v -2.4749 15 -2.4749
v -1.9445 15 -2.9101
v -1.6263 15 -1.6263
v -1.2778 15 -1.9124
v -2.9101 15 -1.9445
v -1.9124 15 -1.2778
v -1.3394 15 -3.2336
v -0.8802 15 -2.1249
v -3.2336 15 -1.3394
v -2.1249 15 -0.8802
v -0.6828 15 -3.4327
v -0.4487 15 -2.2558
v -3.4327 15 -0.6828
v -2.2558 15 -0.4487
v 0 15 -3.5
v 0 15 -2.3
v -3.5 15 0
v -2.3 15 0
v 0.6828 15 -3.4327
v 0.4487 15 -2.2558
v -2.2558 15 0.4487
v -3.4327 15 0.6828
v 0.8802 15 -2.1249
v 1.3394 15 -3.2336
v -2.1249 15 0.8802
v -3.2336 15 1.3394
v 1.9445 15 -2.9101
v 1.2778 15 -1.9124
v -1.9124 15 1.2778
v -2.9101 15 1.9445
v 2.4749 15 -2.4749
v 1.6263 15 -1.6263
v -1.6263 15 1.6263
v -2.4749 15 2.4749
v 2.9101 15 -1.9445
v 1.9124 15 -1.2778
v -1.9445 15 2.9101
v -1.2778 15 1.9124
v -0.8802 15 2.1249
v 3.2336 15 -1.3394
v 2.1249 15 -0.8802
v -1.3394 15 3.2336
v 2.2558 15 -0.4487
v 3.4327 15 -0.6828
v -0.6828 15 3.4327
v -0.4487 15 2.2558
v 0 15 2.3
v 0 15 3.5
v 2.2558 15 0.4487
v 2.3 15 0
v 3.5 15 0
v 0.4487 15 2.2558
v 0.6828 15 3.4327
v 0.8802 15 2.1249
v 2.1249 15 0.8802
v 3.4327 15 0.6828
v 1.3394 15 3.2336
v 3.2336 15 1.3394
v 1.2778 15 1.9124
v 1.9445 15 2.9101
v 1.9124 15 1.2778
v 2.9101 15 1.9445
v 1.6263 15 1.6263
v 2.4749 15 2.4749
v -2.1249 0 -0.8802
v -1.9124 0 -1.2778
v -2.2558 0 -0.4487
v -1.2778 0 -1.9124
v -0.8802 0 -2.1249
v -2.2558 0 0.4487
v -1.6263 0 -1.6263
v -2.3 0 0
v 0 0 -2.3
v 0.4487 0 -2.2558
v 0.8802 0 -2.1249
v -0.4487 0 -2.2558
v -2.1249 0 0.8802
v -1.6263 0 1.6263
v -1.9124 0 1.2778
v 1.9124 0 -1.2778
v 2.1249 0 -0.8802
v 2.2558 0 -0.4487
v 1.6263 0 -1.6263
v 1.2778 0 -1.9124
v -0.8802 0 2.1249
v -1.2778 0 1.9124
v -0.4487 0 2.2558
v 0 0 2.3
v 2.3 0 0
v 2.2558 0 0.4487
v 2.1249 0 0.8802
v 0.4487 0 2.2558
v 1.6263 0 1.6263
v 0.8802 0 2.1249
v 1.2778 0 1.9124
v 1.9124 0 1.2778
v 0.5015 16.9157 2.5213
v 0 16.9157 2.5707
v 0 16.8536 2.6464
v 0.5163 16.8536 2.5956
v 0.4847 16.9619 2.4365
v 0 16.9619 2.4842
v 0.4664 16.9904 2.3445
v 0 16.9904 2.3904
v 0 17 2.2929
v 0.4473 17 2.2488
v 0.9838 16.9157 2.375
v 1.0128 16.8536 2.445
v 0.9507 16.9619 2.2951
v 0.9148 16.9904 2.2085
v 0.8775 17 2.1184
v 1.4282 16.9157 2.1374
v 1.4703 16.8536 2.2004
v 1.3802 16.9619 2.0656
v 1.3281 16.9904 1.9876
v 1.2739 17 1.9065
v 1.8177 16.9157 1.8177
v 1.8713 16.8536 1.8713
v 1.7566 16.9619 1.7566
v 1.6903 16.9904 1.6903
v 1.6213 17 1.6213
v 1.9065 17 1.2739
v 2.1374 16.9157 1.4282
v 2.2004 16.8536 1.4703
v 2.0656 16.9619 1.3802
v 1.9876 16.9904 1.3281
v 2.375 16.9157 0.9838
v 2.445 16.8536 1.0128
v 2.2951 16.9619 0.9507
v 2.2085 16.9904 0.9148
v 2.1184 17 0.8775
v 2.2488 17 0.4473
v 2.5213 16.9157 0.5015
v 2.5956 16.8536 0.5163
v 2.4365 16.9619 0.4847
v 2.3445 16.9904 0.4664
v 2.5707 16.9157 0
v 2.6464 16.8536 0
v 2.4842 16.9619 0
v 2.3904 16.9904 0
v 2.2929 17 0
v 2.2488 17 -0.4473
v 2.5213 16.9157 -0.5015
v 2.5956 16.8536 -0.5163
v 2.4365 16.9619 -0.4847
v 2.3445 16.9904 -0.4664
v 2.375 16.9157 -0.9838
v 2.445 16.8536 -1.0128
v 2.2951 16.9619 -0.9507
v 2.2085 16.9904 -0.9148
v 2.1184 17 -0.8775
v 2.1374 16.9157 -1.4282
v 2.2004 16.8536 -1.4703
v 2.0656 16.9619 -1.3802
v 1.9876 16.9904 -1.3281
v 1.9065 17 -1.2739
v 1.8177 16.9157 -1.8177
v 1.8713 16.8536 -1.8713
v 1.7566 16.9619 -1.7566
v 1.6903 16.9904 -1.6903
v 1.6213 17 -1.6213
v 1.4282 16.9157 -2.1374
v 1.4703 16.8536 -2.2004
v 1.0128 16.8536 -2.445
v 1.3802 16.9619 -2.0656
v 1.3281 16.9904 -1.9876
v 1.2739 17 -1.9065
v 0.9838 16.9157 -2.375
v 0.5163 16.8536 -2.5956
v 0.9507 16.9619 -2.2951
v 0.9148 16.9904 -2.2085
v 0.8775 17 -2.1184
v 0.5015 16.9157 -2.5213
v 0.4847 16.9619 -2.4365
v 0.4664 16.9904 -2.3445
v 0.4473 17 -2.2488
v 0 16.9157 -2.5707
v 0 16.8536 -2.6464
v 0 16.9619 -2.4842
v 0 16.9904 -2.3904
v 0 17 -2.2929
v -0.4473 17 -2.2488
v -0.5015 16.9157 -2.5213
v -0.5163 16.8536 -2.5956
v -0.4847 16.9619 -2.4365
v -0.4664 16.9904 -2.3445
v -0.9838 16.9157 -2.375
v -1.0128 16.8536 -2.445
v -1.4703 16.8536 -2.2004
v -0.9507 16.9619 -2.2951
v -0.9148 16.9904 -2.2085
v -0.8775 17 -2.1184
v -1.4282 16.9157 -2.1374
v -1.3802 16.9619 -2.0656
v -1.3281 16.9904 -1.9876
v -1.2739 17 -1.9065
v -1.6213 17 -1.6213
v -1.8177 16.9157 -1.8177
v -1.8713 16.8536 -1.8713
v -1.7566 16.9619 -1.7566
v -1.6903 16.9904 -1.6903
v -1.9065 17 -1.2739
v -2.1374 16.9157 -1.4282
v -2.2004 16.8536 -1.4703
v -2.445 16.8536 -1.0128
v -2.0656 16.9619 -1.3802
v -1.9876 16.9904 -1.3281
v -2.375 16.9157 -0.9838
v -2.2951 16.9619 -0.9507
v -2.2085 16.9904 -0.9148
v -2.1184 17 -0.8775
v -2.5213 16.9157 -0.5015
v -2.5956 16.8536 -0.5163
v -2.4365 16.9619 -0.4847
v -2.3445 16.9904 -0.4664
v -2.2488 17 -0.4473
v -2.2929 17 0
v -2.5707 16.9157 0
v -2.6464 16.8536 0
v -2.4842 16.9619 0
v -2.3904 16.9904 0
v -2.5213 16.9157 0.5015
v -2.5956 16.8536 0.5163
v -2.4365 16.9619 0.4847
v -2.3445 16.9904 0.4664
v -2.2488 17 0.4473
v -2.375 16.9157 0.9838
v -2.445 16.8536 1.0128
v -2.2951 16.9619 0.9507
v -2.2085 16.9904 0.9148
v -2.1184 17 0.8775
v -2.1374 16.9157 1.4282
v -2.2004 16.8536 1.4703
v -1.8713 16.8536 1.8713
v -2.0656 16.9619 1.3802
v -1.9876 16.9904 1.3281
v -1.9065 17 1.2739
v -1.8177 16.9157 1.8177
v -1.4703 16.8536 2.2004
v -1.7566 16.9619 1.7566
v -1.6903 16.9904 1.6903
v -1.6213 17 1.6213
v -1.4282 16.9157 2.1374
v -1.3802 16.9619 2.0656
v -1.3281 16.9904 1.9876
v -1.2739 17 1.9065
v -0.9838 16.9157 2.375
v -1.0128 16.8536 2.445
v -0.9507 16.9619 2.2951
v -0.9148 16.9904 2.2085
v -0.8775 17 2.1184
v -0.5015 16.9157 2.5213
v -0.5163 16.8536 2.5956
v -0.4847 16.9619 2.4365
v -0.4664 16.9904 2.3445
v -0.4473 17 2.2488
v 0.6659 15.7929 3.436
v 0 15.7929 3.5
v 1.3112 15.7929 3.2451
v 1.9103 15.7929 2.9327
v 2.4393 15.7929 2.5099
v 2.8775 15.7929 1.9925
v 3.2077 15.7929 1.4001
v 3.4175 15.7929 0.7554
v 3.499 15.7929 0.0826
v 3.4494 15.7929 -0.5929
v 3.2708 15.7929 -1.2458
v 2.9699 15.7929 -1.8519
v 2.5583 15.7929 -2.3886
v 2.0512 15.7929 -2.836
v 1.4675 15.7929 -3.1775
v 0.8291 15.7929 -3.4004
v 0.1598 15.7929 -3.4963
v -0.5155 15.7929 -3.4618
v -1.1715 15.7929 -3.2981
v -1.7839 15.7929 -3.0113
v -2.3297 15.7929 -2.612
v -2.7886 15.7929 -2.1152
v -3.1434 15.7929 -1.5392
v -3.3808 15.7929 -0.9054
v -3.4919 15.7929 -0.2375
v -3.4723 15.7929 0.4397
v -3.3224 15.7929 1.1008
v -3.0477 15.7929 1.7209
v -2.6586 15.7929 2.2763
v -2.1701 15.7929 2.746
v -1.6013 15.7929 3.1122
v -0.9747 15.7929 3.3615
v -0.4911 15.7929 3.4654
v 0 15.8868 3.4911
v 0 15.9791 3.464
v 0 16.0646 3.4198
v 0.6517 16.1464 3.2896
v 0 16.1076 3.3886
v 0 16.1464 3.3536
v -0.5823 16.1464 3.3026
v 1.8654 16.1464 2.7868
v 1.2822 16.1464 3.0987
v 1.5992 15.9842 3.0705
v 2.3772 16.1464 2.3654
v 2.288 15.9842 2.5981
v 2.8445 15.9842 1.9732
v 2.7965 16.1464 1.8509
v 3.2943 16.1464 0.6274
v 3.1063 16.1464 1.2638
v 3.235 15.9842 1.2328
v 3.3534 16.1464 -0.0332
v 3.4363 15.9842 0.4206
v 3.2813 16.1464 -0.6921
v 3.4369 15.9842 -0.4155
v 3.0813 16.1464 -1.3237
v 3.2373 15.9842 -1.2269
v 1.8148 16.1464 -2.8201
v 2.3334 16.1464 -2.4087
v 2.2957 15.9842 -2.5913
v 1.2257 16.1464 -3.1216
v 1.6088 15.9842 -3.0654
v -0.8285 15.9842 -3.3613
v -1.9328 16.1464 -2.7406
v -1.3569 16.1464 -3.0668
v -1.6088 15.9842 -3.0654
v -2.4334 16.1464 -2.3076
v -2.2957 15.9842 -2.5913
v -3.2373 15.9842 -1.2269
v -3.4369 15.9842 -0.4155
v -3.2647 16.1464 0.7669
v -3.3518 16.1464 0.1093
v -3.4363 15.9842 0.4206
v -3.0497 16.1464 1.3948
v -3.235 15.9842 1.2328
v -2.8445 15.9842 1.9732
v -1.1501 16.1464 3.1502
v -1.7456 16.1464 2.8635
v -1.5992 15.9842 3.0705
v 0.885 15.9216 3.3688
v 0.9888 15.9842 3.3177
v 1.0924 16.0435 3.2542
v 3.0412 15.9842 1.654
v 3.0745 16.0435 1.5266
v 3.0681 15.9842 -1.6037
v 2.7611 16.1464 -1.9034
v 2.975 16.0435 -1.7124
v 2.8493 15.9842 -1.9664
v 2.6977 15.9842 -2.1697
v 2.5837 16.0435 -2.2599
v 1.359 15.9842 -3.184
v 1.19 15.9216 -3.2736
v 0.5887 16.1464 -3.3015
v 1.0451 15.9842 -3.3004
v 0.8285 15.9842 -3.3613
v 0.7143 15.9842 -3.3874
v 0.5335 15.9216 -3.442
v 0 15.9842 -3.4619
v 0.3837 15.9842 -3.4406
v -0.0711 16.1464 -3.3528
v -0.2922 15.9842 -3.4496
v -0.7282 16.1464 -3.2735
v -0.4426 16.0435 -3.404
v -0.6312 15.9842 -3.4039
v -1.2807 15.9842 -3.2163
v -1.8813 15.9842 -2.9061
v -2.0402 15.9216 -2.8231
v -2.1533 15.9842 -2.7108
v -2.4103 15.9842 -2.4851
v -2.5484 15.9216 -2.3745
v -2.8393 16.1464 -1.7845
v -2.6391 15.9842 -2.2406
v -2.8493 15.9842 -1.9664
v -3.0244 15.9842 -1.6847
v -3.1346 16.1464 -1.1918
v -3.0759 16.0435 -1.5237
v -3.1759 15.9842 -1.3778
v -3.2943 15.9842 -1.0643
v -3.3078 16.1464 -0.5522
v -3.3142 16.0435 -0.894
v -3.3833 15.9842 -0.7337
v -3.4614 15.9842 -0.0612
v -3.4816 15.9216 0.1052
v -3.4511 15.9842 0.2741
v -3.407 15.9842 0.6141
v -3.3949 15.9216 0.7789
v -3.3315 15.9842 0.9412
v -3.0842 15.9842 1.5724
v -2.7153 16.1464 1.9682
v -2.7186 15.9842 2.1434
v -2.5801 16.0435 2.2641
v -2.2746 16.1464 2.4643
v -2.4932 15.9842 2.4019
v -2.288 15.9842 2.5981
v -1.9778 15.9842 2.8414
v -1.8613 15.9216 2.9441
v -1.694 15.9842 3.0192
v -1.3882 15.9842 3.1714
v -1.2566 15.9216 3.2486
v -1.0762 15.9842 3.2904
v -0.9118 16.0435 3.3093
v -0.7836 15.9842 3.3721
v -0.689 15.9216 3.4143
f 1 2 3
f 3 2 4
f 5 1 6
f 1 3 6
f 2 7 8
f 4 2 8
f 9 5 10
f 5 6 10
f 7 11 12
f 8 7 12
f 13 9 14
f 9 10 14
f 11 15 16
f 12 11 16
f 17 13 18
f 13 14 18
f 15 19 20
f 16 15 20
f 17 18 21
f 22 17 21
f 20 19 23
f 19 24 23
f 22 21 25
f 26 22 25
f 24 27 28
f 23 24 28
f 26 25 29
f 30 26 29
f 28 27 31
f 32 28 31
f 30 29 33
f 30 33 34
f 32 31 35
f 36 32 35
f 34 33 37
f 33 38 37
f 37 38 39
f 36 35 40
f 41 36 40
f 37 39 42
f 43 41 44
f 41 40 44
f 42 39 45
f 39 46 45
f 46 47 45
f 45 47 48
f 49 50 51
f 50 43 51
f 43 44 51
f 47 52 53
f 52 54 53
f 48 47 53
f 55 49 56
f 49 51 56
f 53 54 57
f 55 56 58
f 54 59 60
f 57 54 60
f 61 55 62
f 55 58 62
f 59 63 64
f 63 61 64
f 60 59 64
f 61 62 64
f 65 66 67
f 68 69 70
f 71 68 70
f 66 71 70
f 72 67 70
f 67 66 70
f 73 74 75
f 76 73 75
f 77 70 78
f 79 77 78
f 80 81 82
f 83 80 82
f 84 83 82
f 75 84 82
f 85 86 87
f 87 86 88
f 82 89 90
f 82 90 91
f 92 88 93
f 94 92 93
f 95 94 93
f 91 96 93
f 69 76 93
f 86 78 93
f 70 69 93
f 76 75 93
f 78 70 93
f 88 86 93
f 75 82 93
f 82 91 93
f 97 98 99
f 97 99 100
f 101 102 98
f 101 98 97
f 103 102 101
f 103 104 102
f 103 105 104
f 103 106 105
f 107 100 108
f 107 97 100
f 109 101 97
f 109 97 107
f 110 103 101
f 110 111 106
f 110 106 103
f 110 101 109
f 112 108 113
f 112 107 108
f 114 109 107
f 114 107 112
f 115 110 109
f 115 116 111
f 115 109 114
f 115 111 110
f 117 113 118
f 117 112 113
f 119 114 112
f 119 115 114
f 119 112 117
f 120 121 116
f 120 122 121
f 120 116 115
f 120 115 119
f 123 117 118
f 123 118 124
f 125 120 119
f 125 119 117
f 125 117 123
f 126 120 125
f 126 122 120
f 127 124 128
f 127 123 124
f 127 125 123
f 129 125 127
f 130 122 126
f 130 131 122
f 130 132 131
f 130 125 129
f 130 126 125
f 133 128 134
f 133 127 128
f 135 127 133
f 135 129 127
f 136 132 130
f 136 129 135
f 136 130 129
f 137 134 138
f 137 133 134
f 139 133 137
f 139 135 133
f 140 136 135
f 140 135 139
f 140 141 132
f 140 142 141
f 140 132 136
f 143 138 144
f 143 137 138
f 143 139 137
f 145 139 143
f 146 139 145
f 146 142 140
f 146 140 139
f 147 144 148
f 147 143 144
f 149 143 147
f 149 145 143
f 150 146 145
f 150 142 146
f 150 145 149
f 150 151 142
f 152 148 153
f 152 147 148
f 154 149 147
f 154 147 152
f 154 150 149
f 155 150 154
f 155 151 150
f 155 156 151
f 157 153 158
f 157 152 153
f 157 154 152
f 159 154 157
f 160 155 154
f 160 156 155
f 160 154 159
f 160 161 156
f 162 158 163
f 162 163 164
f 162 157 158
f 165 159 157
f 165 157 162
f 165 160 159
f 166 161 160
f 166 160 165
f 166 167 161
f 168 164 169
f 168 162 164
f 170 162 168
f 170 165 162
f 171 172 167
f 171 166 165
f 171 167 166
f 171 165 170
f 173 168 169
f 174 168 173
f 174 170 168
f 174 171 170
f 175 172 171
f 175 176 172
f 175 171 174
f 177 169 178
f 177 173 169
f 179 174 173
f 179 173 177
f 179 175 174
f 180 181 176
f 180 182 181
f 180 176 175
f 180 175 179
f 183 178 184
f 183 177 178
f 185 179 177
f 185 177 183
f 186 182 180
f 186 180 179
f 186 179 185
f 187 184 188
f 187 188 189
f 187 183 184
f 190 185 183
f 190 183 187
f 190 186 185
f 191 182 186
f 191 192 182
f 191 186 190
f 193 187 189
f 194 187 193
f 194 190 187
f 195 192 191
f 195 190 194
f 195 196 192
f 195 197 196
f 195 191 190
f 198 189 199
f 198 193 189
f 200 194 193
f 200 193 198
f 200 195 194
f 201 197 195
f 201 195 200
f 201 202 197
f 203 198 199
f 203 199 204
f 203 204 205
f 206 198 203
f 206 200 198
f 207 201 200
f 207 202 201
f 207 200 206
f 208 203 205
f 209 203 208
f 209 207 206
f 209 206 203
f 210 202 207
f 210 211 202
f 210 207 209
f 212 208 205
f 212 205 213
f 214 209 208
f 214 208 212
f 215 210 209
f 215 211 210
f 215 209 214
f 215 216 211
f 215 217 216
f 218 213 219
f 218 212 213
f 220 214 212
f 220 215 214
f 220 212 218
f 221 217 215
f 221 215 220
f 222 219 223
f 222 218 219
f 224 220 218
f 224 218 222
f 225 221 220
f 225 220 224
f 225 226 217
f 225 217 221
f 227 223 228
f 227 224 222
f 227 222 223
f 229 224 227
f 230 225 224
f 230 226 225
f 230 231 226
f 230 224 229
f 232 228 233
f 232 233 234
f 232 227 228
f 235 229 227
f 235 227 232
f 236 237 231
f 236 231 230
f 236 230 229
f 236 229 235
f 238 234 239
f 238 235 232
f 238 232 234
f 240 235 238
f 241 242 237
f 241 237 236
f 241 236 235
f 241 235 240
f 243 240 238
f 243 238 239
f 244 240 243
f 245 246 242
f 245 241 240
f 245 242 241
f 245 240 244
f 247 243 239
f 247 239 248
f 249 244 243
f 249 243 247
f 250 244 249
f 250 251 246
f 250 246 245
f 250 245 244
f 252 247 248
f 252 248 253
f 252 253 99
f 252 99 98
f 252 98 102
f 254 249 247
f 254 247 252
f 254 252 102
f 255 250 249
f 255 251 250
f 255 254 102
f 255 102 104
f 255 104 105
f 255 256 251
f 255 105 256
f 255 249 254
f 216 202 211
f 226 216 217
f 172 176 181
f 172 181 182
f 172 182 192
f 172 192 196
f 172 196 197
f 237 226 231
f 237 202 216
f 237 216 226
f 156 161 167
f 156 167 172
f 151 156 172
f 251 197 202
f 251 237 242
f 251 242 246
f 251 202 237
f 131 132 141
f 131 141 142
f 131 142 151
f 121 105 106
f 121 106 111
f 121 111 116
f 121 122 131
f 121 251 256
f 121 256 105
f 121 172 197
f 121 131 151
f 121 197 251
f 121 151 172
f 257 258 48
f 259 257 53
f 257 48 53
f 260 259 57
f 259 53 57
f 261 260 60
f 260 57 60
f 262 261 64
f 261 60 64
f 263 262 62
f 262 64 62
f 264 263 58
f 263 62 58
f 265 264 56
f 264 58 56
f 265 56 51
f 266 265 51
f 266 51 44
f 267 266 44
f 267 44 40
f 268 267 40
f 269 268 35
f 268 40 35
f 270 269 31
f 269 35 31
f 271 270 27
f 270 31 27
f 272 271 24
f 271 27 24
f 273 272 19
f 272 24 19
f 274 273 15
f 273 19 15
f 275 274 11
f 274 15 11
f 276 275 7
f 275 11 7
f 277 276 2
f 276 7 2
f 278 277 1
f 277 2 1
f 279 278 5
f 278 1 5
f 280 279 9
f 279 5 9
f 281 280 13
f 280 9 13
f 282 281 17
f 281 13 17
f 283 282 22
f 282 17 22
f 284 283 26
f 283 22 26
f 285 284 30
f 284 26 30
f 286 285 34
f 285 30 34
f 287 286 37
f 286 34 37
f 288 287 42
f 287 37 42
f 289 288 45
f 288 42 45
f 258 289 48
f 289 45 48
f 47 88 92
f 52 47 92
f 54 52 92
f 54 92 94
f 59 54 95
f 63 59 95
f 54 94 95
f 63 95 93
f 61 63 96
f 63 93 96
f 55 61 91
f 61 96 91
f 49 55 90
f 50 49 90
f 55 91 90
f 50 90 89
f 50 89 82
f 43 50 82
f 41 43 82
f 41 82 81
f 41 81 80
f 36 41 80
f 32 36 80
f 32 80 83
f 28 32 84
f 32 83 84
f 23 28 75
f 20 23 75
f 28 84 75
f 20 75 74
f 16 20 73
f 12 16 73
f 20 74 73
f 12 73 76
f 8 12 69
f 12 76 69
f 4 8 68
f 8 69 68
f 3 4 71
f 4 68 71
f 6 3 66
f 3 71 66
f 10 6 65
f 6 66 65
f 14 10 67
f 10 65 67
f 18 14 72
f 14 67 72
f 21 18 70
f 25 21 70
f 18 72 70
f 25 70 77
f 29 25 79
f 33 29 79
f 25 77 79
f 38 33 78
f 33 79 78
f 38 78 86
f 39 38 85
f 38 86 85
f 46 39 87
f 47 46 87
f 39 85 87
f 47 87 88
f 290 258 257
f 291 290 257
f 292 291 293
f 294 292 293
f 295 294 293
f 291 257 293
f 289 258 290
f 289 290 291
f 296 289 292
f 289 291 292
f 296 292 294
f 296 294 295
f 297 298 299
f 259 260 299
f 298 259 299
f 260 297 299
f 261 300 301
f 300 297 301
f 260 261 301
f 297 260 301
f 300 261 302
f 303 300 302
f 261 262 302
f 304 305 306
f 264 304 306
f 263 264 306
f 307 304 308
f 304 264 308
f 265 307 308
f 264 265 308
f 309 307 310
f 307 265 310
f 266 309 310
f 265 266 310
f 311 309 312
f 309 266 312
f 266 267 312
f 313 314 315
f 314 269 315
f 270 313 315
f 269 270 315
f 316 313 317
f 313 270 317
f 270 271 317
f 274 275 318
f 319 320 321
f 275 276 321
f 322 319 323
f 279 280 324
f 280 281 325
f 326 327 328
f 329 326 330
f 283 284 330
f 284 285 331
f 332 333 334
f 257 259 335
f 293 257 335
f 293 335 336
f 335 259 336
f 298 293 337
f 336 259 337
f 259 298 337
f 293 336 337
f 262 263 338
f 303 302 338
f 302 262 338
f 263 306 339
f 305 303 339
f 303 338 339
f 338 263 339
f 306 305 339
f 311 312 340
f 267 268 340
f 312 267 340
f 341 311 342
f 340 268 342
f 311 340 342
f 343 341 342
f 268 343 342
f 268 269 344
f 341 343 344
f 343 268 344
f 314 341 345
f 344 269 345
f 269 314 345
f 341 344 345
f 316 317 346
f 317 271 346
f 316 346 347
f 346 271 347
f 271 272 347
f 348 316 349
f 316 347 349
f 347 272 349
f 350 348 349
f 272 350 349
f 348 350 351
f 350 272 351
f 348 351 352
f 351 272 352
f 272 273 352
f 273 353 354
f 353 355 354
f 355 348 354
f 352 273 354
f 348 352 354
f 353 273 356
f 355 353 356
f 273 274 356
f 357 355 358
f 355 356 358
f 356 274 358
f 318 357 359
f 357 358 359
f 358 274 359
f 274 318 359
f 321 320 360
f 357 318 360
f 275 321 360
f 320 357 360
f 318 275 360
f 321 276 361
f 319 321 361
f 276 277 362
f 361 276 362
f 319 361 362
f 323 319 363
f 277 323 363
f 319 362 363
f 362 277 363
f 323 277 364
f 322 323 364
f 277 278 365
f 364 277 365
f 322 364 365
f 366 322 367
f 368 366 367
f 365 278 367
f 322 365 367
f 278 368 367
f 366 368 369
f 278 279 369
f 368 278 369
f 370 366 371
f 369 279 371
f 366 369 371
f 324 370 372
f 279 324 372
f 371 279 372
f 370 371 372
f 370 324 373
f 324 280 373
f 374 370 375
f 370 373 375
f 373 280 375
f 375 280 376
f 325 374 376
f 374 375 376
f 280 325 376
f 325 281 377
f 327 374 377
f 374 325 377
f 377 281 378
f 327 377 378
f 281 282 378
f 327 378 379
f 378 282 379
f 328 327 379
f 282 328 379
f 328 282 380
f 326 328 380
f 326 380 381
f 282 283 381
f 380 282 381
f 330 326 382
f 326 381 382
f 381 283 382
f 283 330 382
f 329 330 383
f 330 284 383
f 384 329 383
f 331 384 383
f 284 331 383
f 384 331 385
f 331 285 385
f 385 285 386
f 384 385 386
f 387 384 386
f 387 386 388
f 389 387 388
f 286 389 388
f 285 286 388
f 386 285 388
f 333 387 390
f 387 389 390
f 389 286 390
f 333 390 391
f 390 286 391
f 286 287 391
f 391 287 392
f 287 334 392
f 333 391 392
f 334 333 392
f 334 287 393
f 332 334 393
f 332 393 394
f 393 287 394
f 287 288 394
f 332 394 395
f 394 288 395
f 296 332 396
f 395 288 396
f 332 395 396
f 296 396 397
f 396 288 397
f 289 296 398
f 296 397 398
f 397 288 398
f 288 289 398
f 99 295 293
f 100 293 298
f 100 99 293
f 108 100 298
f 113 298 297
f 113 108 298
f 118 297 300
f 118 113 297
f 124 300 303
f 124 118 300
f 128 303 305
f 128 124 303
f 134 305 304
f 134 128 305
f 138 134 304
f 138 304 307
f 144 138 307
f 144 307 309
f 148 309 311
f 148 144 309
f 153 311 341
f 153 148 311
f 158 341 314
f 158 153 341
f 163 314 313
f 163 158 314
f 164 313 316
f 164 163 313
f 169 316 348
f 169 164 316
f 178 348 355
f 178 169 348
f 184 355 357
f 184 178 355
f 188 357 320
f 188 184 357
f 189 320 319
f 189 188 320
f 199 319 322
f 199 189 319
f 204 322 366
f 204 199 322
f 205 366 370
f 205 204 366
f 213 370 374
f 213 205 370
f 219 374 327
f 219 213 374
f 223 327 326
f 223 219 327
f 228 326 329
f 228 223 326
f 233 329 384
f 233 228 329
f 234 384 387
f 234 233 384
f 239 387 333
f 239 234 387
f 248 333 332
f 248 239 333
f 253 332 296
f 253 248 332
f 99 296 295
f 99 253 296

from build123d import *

# Parameters (mm, degrees)
SKETCH1_R           = 2.3
BOSS_EXTRUDE1_DEPTH = 15
SKETCH2_R           = 3.5
BOSS_EXTRUDE2_DEPTH = 2
CHAMFER1_SIZE       = 1
FILLET1_R           = 0.5


with BuildPart() as part:
    # Sketch1 → Boss-Extrude1 (new body)
    with BuildSketch(Plane(origin=(0, 0, 0), x_dir=(1, 0, 0), z_dir=(0, 1, 0))):
        with Locations(Location((0, 0, 0), (0, 0, 270))):
            Circle(SKETCH1_R)
    extrude(amount=BOSS_EXTRUDE1_DEPTH)

    # Sketch2 → Boss-Extrude2 (add)
    with BuildSketch(Plane(origin=(0, 15, 0), x_dir=(1, 0, 0), z_dir=(0, 1, 0))):
        with Locations(Location((0, 0, 0), (0, 0, 270))):
            Circle(SKETCH2_R)
    extrude(amount=BOSS_EXTRUDE2_DEPTH)

    # Chamfer1
    chamfer1_edges = [part.edges().sort_by_distance(p)[0] for p in [
        (0, 17, -3.5),
    ]]
    chamfer(chamfer1_edges, length=CHAMFER1_SIZE)

    # Fillet1
    fillet1_edges = [part.edges().sort_by_distance(p)[0] for p in [
        (0, 17, -2.5),
        (0, 16, -3.5),
    ]]
    fillet(fillet1_edges, radius=FILLET1_R)


solid = part.part
